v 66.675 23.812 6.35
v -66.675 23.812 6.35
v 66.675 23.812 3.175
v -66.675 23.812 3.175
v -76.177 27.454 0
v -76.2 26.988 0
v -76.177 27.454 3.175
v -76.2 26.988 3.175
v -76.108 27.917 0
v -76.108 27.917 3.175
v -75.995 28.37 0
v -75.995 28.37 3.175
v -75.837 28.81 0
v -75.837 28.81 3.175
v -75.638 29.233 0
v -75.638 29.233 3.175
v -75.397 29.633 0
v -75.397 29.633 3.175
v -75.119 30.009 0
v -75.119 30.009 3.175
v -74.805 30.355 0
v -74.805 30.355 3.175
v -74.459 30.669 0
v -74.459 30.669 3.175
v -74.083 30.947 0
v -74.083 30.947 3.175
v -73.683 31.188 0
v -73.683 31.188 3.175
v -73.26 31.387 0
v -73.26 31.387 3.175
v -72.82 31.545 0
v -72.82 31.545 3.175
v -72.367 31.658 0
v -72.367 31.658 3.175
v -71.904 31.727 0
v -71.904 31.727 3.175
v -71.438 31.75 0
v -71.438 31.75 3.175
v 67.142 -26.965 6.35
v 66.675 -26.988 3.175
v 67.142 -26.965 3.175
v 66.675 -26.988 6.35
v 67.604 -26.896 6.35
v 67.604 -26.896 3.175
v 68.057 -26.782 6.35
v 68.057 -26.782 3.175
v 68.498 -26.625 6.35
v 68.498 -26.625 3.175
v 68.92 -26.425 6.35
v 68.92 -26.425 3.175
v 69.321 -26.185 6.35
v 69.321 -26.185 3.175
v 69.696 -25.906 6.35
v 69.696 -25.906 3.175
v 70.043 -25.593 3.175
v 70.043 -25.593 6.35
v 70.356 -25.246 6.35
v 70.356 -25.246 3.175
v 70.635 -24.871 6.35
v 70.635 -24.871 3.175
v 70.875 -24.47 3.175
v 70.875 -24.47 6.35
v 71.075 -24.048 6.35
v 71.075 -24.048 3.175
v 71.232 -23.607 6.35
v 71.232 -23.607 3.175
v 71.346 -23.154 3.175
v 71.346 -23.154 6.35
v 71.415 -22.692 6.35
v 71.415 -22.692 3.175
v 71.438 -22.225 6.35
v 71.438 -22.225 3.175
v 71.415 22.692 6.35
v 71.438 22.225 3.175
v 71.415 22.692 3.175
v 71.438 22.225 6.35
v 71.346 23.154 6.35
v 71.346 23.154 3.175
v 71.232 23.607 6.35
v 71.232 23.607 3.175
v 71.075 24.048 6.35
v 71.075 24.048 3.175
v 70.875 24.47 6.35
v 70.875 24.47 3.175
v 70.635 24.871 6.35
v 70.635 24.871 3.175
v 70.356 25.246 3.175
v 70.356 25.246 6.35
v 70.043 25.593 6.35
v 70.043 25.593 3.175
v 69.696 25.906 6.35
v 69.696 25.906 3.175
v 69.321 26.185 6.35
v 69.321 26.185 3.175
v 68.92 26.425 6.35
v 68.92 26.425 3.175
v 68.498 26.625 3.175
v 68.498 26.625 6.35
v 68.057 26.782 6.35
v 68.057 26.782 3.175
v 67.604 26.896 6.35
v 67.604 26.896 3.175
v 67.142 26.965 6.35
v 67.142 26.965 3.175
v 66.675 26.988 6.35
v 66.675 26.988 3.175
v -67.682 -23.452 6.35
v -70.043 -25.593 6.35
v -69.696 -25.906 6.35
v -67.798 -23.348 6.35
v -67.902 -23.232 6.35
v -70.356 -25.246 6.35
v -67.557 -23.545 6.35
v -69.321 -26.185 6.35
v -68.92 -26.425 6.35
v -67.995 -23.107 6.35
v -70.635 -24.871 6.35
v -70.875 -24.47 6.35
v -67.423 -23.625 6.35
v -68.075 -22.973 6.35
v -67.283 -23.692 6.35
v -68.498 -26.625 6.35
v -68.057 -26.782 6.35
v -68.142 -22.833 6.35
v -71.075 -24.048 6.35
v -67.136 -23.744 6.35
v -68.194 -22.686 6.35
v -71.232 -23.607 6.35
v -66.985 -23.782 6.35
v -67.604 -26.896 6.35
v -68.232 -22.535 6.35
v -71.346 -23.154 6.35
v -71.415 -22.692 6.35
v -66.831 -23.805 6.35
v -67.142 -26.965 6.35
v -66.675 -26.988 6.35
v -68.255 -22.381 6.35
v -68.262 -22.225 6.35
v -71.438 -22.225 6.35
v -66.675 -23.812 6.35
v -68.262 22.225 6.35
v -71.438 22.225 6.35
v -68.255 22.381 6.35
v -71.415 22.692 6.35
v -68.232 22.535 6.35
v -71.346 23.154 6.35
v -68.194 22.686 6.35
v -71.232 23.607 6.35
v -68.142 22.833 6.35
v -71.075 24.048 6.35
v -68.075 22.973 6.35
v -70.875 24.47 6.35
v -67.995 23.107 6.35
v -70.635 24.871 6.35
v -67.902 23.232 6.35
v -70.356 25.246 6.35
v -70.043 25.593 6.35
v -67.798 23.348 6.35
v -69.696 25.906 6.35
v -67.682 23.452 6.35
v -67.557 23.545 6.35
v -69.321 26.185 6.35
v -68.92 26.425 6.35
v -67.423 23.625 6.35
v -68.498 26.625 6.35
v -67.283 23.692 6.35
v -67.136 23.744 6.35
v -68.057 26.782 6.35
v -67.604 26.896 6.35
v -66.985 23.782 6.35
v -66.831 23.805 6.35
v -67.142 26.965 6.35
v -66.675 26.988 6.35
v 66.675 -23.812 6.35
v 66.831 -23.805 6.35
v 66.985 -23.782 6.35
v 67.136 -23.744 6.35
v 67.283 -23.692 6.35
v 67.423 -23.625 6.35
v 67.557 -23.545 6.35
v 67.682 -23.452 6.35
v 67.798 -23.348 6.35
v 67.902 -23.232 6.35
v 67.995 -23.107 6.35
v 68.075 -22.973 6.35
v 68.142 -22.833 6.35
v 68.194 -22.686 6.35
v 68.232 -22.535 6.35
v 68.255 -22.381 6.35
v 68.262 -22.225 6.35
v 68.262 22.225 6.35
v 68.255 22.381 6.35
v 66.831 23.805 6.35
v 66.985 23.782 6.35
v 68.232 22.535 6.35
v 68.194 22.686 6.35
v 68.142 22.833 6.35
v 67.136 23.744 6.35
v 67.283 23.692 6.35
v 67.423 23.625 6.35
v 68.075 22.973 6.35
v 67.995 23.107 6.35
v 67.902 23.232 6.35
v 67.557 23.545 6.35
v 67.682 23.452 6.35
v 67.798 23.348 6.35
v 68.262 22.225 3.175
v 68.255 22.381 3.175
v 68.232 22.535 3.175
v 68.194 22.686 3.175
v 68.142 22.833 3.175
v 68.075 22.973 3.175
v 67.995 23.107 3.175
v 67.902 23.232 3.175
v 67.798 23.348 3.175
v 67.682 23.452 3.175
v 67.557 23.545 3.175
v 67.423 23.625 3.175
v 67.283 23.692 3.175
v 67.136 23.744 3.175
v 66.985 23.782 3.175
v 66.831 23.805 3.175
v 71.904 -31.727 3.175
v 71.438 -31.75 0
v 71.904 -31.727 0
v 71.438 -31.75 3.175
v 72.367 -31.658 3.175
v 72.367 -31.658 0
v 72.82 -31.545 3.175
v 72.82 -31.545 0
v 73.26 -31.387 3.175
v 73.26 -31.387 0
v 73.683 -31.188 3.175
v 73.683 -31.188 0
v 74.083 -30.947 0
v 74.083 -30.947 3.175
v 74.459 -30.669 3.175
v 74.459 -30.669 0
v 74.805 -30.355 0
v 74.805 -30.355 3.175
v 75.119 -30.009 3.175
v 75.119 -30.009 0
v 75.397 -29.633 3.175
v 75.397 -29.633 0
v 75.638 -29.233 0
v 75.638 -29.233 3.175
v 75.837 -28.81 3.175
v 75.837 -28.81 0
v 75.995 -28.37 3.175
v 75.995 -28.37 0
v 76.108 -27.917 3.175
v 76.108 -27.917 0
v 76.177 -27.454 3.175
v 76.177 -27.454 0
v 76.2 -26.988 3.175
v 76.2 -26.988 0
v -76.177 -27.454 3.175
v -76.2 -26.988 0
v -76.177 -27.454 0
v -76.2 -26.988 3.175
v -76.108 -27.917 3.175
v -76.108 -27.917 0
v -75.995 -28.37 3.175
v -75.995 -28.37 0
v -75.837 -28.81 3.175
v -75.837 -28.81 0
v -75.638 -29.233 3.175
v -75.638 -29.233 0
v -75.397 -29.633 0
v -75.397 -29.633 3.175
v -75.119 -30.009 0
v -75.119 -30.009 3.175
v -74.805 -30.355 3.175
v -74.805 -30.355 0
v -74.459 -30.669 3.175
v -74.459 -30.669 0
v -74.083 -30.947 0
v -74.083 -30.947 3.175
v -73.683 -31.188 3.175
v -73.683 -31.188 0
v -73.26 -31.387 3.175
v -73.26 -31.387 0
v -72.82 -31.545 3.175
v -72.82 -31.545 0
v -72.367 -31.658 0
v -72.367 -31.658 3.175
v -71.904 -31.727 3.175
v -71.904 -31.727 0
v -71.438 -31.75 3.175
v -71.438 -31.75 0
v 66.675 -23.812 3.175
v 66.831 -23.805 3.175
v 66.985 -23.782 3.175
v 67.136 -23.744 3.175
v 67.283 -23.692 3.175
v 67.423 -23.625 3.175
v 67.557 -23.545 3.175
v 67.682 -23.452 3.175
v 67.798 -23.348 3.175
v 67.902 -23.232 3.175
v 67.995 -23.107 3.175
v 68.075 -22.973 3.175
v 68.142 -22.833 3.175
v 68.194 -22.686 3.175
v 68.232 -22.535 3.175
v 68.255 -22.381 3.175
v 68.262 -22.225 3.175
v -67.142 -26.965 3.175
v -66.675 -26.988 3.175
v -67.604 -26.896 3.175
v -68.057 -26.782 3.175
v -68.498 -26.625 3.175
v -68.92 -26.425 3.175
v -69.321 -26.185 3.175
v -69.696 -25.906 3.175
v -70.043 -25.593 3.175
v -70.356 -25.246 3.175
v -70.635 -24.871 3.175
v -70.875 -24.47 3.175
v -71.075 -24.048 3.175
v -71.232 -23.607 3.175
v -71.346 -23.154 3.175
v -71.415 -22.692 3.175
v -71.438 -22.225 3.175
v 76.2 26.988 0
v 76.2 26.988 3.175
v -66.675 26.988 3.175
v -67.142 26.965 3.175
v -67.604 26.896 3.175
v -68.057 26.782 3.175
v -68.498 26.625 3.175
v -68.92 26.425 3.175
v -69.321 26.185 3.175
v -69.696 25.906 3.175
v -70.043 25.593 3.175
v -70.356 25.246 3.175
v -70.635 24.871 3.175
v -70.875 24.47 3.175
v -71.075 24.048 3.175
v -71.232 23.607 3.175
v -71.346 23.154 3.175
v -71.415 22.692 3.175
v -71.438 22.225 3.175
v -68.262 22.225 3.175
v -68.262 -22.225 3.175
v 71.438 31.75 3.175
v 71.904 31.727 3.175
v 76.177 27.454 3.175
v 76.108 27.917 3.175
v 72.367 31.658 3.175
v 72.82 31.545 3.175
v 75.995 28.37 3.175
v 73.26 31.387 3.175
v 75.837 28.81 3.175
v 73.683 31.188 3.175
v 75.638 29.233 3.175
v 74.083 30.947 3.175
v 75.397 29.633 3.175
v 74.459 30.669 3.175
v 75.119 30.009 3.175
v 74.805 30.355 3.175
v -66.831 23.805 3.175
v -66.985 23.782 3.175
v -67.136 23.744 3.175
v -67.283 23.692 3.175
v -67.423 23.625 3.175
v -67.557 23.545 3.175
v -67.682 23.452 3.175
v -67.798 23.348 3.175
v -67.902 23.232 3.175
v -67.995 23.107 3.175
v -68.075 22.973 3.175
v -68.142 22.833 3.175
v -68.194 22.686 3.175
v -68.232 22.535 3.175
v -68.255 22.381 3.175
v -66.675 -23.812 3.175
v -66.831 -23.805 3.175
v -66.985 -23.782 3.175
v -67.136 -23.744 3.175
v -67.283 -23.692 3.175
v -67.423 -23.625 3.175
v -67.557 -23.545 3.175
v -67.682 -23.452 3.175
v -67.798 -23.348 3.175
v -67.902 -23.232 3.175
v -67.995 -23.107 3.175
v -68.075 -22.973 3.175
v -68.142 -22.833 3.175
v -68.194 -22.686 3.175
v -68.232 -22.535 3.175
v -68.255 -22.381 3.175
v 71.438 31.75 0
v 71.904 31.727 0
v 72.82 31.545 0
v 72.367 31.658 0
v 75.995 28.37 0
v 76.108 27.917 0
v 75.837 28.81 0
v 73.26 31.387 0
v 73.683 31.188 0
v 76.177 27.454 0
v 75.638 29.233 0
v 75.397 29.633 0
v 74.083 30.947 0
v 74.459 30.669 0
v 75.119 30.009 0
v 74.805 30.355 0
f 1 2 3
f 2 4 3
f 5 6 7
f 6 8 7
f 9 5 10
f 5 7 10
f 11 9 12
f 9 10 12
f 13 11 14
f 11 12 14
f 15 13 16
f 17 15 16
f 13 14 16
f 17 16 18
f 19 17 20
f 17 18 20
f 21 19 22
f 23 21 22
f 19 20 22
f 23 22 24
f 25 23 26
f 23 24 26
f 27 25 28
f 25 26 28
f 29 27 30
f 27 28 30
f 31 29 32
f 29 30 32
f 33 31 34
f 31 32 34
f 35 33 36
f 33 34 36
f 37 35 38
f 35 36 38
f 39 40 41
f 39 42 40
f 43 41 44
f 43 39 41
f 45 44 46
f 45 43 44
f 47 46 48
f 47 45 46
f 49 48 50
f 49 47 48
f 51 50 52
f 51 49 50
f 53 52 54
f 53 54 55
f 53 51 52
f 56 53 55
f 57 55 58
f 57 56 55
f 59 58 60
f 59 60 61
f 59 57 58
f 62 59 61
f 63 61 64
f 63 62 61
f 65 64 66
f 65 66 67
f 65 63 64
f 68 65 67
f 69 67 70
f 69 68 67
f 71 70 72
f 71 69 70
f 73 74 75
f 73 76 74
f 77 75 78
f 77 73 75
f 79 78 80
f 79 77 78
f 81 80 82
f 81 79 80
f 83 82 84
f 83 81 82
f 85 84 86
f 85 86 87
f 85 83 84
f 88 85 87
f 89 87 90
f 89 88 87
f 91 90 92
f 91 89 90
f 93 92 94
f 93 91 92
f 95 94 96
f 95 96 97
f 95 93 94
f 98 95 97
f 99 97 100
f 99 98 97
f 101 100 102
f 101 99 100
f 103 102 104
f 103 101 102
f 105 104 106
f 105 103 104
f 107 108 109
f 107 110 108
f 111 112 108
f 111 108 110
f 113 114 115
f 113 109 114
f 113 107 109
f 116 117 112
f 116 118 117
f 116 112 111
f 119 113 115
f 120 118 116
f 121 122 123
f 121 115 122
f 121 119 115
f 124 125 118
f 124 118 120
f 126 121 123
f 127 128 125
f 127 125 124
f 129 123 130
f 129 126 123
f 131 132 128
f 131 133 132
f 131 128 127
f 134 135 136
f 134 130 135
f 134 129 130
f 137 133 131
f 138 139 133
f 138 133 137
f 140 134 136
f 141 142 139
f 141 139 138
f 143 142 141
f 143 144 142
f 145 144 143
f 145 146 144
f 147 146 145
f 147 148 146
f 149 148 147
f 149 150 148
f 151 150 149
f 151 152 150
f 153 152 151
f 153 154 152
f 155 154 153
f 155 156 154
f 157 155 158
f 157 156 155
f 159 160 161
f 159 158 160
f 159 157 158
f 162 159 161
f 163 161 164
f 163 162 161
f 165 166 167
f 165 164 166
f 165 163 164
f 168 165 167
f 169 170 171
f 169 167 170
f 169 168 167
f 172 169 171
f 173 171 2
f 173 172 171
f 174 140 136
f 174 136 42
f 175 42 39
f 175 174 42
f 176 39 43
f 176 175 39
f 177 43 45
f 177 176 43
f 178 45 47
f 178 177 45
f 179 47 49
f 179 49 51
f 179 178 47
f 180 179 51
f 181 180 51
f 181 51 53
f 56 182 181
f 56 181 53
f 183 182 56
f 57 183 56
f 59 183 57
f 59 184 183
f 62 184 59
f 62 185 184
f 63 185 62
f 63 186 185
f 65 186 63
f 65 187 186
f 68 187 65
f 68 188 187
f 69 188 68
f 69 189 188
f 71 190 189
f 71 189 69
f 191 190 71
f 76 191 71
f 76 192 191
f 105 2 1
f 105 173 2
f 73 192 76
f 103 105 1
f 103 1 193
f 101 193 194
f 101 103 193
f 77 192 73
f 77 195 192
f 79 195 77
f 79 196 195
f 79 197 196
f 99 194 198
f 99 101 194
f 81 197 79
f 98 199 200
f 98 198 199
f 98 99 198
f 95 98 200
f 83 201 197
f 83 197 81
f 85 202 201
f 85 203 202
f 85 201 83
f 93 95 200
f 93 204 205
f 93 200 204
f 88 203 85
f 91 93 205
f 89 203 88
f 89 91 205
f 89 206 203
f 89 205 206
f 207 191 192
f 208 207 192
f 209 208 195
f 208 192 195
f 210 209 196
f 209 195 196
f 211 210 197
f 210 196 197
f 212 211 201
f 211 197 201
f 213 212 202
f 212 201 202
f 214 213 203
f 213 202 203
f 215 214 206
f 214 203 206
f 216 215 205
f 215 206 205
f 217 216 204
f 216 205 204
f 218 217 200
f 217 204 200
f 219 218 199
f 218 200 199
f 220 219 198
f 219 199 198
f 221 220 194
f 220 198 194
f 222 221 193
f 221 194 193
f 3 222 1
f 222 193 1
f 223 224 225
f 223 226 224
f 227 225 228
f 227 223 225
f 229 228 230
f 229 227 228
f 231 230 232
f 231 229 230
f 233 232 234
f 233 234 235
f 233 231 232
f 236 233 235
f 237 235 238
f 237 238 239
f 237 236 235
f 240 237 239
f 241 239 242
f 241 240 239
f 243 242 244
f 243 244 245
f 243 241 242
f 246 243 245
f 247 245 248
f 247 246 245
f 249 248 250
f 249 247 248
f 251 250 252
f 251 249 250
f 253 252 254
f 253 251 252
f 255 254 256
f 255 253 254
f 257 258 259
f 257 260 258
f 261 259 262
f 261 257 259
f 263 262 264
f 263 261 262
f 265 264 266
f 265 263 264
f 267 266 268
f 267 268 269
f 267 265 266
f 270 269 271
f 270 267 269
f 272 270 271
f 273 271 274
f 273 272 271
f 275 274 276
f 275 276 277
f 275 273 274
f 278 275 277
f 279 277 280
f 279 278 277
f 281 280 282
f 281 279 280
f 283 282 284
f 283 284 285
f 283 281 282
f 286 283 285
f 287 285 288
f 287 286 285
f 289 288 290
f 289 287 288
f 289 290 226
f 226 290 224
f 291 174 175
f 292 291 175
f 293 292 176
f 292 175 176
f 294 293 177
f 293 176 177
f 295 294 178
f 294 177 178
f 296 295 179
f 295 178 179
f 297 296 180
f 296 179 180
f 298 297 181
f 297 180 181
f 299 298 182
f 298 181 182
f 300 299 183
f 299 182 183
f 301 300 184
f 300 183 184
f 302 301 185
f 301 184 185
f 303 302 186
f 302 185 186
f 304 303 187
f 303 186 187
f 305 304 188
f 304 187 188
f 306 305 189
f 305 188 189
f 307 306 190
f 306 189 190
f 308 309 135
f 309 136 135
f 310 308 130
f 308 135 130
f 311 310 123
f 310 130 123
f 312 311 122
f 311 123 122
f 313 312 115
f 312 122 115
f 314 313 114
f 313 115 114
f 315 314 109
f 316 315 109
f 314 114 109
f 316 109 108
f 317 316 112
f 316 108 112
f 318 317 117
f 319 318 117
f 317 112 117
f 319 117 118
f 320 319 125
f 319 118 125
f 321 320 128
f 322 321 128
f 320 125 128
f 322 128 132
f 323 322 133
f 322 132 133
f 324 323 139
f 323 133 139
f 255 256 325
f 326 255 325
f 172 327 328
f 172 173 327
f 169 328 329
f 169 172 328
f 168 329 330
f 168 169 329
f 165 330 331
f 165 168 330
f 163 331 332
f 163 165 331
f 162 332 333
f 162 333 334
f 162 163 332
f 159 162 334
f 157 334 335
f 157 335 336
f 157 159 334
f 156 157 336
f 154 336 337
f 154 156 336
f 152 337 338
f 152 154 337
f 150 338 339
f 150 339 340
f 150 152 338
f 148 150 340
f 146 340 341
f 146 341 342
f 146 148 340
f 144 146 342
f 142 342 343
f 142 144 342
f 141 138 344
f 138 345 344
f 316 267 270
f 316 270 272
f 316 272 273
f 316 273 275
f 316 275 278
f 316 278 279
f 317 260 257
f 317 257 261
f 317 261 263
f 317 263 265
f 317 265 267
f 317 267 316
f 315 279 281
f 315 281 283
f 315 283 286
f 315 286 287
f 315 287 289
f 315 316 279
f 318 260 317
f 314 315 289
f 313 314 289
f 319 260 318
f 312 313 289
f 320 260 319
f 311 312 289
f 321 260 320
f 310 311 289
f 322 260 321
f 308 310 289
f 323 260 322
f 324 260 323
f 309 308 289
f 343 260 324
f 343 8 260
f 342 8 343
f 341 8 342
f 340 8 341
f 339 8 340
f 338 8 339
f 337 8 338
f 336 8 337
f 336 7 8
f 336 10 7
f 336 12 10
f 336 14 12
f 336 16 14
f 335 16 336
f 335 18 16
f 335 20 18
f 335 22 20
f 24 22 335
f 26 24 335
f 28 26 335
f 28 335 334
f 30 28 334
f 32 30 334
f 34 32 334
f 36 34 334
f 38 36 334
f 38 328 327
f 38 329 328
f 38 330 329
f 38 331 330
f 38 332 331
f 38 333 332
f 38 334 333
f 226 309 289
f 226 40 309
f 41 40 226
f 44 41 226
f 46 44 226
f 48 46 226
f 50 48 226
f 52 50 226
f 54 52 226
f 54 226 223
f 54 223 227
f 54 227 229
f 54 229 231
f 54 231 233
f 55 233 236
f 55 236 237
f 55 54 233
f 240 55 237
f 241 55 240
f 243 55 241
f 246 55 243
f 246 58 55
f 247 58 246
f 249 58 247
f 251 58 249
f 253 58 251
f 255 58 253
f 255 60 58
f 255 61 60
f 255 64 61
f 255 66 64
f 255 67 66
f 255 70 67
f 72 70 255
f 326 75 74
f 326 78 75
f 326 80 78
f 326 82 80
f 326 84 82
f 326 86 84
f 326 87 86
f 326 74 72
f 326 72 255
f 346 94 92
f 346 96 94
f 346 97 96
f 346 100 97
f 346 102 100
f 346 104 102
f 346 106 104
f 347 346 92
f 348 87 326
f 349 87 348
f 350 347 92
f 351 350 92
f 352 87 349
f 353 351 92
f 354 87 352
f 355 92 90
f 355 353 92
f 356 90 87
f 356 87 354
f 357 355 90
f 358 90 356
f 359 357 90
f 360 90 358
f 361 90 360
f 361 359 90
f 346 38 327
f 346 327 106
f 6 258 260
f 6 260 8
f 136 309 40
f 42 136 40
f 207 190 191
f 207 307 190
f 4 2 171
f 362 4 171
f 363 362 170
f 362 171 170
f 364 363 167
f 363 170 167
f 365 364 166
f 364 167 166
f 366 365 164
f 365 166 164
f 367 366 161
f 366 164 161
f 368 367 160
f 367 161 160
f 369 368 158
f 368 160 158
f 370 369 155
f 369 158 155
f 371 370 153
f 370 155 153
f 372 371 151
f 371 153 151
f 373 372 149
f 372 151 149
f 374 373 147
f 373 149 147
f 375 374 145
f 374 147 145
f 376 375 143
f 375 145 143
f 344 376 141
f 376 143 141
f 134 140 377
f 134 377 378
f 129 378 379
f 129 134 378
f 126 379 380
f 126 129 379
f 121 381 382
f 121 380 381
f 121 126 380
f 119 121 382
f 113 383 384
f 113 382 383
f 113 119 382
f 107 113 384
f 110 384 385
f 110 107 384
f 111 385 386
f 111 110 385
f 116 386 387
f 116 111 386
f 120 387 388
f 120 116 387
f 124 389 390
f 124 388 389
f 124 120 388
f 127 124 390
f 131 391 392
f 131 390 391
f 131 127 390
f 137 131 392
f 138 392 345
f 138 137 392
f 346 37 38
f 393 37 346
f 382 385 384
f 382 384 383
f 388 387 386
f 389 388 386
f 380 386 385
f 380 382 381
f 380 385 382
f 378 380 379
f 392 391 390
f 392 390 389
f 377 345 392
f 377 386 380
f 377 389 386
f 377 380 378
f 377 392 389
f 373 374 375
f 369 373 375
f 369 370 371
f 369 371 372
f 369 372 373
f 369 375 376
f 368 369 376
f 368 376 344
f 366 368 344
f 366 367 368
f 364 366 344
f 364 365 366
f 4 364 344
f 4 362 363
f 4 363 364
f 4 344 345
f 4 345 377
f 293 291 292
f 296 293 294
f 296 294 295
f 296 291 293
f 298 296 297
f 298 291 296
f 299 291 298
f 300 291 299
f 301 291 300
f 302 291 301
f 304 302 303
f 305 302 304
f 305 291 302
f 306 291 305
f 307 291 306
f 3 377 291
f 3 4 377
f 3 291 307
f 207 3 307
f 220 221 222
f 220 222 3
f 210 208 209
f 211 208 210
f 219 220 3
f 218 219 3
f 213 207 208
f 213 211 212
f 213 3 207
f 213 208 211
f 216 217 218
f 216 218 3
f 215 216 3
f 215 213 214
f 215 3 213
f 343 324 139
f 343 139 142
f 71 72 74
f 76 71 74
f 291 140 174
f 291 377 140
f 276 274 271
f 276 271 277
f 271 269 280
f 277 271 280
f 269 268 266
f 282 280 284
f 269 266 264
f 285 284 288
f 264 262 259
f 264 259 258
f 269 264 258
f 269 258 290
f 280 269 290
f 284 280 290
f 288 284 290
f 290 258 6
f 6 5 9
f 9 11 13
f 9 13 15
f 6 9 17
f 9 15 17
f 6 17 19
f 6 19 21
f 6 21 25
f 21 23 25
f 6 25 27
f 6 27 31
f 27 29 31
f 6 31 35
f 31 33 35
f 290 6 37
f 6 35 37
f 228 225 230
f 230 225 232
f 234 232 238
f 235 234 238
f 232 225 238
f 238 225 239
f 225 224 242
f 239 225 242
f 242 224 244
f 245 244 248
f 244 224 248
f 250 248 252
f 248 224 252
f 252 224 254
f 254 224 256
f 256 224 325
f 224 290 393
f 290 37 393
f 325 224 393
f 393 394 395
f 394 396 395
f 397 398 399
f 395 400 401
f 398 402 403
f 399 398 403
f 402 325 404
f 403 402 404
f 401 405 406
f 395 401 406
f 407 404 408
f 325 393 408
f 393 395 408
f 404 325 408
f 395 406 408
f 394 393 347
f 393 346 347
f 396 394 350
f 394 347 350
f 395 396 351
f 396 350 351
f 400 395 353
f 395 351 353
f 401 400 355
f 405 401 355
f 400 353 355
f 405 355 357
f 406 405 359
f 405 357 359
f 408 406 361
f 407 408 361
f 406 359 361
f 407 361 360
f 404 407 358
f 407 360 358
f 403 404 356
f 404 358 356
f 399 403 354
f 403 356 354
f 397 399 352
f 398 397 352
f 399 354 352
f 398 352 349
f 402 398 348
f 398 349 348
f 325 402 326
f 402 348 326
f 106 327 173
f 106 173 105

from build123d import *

# Parameters (mm, degrees)
F0_W     = 152.4
F0_H     = 63.5
F1_DEPTH = 3.175
F2_W     = 142.875
F2_H     = 53.975
F3_DEPTH = 3.175
F4_R     = 4.7625
F5_T     = -3.175


with BuildPart() as f1:
    # F0 (on Top) → F1 (new body)
    with BuildSketch(Plane.XY):
        Rectangle(F0_W, F0_H)
    extrude(amount=F1_DEPTH)

    # F2 (on face) → F3 (join)
    with BuildSketch(Plane.XY.offset(3.175)):
        Rectangle(F2_W, F2_H)
    extrude(amount=F3_DEPTH)

    # F4
    f4_edges = [f1.edges().sort_by_distance(p)[0] for p in [
        (71.4375, -26.9875, 4.7625),
        (71.4375, 26.9875, 4.7625),
        (-71.4375, -26.9875, 4.7625),
        (76.2, -31.75, 1.5875),
        (76.2, 31.75, 1.5875),
        (-76.2, -31.75, 1.5875),
        (-71.4375, 26.9875, 4.7625),
        (-76.2, 31.75, 1.5875),
    ]]
    fillet(f4_edges, radius=F4_R)

    # F5
    f5_openings = [f1.faces().sort_by_distance(p)[0] for p in [
        (0, 0, 6.35),
    ]]
    offset(amount=F5_T, openings=f5_openings, kind=Kind.INTERSECTION)


solid = f1.part
